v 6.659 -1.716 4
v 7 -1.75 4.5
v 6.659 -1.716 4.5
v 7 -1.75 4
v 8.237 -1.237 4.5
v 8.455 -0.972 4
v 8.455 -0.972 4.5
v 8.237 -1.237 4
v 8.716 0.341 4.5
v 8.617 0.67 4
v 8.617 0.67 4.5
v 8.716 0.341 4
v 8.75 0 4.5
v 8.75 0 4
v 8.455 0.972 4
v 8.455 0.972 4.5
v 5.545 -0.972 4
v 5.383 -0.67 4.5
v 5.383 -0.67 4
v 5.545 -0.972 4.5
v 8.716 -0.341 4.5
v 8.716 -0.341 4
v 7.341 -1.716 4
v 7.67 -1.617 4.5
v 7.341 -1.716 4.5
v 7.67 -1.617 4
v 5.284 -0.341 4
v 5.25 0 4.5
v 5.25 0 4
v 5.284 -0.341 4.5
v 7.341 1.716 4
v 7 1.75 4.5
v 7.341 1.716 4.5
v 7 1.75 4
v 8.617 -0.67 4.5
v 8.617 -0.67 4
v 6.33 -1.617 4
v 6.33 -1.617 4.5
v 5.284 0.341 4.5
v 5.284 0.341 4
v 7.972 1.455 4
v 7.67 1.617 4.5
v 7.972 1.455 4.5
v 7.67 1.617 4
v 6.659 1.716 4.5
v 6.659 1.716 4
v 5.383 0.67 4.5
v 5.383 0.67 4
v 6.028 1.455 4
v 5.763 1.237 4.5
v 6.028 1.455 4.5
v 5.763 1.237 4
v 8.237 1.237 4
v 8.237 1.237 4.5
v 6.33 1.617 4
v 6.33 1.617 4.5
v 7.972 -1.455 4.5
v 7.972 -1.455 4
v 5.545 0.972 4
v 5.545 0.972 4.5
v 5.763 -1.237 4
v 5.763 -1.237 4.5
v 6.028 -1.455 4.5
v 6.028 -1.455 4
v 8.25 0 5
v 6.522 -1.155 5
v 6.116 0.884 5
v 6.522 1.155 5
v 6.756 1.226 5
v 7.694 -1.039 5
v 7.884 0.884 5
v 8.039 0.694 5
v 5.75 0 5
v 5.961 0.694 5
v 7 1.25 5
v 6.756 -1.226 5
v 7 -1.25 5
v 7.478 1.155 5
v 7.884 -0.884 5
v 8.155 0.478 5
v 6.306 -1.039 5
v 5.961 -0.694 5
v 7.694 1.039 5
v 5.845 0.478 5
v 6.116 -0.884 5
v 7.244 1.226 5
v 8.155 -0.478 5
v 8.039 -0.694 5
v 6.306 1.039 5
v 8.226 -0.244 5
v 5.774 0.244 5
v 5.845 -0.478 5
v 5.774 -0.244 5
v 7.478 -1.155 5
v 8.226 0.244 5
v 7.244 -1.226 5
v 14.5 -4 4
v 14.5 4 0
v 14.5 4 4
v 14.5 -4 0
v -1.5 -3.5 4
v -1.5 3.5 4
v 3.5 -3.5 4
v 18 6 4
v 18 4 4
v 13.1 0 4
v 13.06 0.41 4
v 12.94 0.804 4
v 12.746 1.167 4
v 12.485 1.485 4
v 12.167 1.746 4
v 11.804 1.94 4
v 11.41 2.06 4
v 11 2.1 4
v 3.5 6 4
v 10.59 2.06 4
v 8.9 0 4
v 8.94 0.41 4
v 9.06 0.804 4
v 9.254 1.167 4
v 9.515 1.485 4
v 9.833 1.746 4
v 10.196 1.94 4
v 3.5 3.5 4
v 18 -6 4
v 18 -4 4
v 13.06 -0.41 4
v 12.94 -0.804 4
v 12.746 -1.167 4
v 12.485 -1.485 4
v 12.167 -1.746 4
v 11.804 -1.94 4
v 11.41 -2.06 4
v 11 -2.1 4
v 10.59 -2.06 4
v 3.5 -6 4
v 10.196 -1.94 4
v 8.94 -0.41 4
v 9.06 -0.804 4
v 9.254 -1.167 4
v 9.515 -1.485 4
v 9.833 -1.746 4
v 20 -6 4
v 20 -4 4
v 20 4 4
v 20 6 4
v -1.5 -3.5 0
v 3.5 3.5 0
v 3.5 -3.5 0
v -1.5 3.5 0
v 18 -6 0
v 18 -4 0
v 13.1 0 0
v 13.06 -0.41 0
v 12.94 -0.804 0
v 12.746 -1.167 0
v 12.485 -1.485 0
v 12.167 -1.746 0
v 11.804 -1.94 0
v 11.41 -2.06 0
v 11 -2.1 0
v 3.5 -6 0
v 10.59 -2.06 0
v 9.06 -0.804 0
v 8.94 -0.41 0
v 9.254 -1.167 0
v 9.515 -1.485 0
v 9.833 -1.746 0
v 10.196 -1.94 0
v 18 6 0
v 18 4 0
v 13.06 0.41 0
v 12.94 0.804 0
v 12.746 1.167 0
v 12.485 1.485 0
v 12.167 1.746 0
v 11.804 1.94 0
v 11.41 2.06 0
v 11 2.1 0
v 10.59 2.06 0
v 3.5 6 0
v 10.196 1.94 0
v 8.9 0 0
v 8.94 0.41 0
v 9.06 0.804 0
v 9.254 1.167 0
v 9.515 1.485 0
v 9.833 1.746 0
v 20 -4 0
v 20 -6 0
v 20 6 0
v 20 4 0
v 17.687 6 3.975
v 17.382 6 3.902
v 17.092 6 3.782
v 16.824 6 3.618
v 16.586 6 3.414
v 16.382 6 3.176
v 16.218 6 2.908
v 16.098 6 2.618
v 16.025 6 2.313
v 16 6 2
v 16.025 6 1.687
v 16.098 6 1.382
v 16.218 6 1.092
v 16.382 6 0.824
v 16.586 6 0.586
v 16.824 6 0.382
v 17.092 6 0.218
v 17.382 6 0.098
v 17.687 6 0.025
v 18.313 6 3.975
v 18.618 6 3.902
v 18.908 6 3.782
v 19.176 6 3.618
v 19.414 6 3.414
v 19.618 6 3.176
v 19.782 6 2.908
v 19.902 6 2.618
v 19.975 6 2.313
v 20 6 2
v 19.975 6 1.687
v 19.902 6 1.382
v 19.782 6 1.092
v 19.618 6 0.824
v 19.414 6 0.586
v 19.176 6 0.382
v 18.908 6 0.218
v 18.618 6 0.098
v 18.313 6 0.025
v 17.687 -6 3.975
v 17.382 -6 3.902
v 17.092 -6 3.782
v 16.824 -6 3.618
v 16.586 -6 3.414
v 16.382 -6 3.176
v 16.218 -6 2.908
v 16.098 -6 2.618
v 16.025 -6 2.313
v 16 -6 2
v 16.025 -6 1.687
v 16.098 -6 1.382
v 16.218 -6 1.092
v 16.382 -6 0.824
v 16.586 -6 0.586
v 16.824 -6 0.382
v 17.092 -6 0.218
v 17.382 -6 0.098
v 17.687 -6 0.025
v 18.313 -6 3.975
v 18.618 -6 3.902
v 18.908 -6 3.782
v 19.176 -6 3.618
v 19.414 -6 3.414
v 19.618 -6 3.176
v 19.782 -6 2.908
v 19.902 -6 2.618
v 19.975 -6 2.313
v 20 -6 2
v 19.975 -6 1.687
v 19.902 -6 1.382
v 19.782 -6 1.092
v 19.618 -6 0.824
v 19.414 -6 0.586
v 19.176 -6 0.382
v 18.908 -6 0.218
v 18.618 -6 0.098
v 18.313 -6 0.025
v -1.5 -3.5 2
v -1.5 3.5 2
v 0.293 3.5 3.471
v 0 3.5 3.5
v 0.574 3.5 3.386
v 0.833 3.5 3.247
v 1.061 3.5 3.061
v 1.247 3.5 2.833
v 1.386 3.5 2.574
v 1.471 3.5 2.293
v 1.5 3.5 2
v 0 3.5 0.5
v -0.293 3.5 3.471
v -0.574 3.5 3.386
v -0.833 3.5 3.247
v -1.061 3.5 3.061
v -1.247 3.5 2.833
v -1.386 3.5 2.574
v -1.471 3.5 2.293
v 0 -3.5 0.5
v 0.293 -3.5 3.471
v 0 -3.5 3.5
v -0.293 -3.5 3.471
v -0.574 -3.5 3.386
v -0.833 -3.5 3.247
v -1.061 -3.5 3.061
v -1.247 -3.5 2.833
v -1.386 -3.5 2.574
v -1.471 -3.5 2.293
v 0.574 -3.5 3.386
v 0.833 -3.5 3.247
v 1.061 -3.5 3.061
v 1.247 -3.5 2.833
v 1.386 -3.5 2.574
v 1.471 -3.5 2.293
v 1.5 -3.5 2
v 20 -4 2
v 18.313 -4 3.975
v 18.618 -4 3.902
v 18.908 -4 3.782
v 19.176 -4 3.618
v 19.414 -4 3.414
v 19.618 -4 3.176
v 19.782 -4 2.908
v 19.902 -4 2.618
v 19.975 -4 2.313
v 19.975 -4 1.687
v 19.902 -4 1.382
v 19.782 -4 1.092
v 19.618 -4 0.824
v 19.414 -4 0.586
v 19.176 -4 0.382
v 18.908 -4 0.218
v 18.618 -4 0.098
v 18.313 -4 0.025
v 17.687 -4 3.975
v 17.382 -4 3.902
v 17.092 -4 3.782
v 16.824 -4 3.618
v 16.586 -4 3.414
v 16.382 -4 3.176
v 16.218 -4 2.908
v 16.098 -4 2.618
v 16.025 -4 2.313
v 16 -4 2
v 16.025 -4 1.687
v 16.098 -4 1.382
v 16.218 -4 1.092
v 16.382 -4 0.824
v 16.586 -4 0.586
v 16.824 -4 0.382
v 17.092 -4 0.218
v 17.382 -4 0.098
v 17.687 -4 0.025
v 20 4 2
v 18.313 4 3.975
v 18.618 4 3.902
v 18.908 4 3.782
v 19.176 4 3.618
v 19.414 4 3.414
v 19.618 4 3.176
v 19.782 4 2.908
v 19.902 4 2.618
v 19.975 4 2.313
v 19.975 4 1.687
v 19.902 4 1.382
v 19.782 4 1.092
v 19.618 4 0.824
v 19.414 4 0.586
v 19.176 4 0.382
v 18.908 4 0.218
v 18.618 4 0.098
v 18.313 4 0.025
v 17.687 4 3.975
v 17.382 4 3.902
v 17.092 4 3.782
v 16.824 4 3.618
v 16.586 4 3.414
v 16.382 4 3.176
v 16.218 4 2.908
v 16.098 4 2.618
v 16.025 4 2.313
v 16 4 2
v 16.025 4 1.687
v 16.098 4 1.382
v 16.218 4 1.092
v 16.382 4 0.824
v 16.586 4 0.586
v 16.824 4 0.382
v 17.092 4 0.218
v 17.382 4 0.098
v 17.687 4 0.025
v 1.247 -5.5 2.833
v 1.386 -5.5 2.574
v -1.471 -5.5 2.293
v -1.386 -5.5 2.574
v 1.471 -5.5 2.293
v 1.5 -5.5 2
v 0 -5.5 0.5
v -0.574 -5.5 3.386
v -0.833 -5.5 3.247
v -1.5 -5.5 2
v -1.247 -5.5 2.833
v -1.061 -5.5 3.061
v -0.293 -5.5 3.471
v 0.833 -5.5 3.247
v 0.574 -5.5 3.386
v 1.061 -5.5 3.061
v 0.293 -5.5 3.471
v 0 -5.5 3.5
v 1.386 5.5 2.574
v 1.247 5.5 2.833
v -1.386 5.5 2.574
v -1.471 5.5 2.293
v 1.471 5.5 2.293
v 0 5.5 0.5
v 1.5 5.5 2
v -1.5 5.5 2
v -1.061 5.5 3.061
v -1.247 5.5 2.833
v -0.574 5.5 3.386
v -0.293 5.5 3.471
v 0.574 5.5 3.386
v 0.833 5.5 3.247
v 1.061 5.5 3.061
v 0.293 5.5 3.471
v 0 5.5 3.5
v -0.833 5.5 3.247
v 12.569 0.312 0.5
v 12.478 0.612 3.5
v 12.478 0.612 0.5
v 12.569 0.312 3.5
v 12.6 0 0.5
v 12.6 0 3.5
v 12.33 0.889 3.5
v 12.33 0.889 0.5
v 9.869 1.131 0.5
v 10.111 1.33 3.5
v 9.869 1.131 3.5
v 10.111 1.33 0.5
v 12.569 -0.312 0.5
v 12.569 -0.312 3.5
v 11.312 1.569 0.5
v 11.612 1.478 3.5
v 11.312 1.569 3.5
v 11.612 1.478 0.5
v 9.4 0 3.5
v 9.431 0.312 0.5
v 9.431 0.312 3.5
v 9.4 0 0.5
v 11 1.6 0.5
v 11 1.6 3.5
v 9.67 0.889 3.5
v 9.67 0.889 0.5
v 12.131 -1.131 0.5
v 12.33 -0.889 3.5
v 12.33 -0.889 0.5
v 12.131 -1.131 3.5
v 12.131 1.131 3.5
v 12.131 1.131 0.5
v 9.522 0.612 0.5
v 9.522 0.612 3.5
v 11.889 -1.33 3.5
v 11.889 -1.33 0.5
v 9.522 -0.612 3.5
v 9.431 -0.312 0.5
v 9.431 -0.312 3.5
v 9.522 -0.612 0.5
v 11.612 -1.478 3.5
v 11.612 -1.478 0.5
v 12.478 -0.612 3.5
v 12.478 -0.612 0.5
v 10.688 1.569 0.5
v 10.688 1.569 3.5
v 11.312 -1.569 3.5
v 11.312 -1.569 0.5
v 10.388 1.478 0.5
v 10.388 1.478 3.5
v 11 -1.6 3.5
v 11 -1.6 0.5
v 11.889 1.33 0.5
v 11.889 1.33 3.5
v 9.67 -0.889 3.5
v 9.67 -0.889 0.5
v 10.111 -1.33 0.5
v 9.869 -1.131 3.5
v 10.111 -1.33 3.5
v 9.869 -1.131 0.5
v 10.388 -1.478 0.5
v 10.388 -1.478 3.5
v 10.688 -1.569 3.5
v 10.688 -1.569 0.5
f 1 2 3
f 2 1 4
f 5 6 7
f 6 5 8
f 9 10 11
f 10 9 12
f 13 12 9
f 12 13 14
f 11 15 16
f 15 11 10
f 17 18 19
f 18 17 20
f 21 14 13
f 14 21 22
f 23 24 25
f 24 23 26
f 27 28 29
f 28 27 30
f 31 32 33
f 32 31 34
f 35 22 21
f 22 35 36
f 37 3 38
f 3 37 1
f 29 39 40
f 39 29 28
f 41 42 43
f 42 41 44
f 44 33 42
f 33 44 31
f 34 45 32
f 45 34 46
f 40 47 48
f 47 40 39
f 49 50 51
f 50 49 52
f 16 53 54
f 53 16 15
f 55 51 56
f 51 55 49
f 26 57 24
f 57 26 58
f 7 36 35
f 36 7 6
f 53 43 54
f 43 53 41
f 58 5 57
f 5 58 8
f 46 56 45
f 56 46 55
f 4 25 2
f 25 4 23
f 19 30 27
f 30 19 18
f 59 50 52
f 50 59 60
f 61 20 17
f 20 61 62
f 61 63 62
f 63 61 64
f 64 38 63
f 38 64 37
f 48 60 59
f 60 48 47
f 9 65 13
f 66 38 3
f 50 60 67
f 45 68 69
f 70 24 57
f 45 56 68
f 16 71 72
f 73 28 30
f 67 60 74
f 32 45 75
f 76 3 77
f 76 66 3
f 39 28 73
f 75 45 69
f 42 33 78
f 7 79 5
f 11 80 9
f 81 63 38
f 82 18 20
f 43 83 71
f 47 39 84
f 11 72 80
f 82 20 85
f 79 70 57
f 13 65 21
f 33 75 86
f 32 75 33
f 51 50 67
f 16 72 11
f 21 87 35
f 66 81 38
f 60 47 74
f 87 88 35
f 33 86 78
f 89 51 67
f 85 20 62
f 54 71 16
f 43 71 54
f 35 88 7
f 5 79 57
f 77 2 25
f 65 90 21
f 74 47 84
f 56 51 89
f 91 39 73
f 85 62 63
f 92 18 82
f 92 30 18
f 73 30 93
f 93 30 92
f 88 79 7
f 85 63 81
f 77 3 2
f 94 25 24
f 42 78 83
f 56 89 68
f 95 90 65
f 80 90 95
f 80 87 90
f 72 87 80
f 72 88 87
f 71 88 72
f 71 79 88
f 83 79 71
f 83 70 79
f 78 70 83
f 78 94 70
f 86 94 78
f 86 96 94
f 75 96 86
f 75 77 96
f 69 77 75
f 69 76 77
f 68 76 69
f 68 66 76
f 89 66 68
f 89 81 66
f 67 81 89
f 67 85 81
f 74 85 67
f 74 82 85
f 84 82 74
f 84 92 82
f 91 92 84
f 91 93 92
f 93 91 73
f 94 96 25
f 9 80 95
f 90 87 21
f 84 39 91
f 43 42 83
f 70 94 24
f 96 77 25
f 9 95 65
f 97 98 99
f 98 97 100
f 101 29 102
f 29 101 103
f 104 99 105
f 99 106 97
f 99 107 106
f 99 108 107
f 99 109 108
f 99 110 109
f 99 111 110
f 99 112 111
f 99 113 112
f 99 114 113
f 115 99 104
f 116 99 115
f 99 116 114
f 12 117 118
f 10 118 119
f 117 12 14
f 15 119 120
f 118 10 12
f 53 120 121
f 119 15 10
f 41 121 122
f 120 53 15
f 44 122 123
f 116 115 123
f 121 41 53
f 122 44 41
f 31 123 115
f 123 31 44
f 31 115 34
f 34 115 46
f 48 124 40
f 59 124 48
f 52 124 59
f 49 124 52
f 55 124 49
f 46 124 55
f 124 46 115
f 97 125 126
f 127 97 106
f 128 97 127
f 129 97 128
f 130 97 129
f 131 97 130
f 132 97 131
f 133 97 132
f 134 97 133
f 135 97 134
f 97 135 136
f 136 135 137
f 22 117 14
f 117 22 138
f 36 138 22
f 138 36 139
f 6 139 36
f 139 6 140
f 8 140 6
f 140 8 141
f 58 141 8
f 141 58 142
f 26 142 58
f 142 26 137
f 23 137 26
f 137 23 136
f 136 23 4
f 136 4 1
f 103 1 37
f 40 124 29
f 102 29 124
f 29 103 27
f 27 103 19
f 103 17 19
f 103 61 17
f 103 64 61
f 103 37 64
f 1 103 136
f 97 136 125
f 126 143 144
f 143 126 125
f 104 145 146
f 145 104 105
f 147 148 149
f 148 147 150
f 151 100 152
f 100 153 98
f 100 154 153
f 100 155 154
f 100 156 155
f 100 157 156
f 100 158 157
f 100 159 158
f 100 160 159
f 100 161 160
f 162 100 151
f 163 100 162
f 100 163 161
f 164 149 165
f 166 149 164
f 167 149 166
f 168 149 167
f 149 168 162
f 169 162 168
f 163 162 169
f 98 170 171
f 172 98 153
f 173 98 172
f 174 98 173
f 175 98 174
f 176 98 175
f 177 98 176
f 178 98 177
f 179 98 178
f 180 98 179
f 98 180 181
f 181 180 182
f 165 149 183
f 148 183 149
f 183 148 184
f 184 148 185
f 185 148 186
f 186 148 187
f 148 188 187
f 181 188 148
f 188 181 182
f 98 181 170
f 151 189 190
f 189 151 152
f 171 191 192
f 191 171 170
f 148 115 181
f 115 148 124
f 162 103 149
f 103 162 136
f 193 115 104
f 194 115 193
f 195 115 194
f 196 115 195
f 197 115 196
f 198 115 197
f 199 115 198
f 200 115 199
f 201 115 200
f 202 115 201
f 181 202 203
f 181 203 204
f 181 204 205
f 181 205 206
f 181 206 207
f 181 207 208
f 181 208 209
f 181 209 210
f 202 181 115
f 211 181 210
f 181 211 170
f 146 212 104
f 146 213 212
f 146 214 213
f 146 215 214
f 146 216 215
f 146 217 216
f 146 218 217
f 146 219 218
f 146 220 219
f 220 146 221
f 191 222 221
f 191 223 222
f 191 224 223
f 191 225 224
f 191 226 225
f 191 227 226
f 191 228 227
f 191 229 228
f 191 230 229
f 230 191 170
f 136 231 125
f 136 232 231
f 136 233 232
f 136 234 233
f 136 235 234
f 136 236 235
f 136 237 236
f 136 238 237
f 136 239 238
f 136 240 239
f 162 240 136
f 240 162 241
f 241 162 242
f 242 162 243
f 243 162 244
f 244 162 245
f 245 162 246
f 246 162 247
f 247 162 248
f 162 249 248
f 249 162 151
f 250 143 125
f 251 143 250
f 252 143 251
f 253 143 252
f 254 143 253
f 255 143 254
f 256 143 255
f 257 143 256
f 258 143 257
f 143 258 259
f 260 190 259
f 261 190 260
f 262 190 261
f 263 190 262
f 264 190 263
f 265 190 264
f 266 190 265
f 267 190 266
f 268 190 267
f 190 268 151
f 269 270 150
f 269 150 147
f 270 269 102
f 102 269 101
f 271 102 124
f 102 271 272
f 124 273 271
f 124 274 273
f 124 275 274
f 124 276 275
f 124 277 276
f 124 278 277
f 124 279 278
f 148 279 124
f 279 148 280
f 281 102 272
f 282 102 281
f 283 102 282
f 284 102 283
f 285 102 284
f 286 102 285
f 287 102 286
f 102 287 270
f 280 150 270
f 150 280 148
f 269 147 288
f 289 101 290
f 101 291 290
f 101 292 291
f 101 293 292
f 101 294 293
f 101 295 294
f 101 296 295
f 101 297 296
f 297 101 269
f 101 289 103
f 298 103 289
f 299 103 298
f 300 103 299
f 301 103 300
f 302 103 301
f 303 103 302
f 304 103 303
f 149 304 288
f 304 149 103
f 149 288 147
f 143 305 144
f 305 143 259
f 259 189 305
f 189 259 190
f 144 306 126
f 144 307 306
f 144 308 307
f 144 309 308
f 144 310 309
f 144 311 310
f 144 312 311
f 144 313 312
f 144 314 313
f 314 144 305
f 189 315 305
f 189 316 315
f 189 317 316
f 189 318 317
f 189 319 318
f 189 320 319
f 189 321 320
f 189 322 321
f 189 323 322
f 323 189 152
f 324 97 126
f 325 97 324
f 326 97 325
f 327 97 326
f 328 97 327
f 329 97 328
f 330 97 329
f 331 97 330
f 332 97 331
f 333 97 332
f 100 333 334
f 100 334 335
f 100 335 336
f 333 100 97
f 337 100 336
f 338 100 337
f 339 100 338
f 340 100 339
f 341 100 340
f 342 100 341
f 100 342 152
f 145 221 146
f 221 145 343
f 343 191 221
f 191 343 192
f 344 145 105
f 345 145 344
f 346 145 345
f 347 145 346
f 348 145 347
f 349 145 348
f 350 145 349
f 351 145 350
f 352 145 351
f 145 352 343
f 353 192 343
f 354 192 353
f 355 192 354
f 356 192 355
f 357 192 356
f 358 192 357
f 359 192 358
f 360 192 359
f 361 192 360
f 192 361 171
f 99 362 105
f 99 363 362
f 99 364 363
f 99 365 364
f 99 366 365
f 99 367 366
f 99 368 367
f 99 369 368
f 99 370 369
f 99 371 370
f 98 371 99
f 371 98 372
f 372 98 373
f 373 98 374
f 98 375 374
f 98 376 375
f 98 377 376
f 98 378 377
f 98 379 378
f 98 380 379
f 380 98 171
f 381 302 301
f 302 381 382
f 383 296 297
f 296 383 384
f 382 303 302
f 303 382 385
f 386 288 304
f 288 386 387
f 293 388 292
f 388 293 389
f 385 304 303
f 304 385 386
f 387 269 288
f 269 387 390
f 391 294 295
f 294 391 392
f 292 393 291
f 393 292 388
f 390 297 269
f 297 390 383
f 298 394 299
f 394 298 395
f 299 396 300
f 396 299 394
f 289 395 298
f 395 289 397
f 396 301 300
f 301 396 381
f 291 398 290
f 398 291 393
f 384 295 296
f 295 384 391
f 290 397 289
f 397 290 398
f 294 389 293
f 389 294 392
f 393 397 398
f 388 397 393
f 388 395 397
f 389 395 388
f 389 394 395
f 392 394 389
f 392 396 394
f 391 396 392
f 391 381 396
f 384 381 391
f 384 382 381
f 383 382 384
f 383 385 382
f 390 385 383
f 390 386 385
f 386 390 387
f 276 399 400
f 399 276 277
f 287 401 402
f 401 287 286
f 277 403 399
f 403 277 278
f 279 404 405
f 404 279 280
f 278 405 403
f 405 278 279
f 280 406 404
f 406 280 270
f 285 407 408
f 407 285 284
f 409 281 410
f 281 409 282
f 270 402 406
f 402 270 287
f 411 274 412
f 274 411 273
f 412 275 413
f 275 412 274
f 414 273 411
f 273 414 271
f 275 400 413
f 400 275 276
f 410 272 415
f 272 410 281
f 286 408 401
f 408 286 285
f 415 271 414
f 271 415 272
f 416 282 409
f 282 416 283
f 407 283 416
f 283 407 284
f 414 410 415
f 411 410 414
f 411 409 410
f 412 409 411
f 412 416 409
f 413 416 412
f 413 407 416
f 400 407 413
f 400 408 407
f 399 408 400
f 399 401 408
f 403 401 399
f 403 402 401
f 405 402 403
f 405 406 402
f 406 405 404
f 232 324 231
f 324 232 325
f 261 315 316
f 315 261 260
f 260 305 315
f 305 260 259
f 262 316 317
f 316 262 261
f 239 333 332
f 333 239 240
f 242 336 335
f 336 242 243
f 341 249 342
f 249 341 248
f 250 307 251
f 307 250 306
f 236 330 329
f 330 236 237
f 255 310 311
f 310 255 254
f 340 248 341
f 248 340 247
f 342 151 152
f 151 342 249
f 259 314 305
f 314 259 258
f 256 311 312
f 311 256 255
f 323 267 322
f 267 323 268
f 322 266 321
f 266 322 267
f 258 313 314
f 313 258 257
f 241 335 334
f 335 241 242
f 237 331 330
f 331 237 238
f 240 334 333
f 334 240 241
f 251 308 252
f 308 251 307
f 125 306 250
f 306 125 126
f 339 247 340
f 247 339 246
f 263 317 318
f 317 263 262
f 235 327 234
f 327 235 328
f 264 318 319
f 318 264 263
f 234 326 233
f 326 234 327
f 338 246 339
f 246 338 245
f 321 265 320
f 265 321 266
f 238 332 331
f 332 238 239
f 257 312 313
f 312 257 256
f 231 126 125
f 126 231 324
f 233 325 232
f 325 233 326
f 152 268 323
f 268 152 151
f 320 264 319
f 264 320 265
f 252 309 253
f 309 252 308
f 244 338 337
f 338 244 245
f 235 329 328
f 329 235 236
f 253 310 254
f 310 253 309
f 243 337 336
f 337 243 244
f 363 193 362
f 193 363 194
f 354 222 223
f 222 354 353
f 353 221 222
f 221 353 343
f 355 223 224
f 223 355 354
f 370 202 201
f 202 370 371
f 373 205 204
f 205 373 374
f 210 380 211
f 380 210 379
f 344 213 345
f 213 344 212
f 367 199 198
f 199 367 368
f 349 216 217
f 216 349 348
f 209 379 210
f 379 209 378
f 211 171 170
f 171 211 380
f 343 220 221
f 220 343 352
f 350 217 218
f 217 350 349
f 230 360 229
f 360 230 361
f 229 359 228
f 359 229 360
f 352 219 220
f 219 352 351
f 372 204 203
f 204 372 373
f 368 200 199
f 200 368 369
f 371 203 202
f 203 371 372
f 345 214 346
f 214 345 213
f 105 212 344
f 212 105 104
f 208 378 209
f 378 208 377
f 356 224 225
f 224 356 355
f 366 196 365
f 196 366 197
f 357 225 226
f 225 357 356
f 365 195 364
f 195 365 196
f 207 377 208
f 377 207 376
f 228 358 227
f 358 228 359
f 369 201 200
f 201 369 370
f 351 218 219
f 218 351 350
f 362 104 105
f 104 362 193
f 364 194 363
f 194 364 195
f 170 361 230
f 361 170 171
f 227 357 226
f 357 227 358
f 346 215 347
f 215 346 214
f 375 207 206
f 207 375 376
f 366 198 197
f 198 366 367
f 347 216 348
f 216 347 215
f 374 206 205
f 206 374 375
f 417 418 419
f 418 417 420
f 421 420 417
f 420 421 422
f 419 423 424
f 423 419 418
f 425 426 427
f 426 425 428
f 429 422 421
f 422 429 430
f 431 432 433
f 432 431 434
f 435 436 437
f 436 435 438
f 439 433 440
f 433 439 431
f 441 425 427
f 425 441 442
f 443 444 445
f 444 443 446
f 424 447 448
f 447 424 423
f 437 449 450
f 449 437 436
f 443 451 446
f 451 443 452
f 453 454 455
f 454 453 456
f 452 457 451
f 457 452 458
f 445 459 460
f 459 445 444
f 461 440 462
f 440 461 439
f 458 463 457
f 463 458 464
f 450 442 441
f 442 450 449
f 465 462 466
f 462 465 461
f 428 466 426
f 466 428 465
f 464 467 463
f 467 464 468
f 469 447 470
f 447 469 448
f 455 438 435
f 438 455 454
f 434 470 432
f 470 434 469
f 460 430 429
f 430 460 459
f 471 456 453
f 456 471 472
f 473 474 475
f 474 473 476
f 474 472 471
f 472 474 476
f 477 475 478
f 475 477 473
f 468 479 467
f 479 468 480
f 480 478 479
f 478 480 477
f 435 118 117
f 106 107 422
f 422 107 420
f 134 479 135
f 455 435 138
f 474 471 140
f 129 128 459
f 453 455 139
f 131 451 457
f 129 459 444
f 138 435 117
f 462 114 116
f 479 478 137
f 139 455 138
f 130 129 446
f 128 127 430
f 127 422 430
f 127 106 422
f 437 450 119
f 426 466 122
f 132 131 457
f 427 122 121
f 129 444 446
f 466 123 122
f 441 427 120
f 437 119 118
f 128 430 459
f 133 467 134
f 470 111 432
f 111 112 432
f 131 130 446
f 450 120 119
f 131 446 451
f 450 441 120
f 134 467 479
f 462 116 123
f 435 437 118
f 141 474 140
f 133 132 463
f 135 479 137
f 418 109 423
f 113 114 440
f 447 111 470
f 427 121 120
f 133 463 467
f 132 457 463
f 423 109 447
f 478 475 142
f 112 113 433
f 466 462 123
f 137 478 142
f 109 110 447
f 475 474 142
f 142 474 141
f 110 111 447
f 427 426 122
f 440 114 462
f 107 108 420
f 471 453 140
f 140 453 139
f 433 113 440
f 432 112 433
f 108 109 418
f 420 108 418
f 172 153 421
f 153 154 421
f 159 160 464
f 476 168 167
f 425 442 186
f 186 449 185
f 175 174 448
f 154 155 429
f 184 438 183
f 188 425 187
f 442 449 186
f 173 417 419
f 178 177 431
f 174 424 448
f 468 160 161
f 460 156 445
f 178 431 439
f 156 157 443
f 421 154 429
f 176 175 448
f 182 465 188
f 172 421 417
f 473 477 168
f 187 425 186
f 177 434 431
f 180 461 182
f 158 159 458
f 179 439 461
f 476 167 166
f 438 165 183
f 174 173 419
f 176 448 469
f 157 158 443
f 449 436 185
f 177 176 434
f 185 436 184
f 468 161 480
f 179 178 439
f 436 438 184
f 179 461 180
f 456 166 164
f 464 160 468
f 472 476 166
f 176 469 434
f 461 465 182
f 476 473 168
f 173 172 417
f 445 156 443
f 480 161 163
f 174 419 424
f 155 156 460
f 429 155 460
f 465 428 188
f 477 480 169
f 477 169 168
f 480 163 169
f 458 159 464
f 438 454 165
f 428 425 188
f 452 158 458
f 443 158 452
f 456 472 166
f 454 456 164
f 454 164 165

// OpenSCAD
// Bracelet of hinged links, printed in place
// Print orientation: flat on bed, +Z up, min z = 0
// Link: pitch 18 (X), width 12 (Y), thickness 5 (Z incl. snap stud)
// Hinge: horizontal pin along Y, teardrop pin in round hole, 0.5mm clearance

part = "link"; // [link, assembly]
cadverify_only = "";

module instance(name, part, unit = 1) {
    echo(cadverify_instance = [name, part, unit]);
    if (cadverify_only == "" || cadverify_only == name) children();
}

// ---- parameters ----
P = 18;            // pitch (hinge to hinge)
W = 12;            // width (Y)
Hb = 4;            // body thickness (Z 0-4)
Hs = 1;            // stud height (Z 4-5)
Zc = 2.0;          // hinge axis height
Rp = 1.5;          // pin radius (teardrop, tip dist 1.5)
Rh = 2.0;          // hole radius
Ytong = 3.5;       // tongue half width
Yin = 4.0;         // leaves inner face
Yout = 6.0;        // outer半 width
Xrear = -1.5;      // rear face (pin rear)
Xsr = 3.5;         // spine rear (overlap)
Xsf = 14.5;       // spine front (overlap)
Xlr = 13.5;        // leaves rear
Xfront = 20;       // front face
XpinR = 0;         // rear pin x
XpinF = 18;        // front hole x
studX = 7; studR = 1.75;
holeX = 11; holeR = 1.6;

module teardrop2D() {
    RpL = 1.5; ZcL = 2.0;
    pts = concat(
        [for (a=[0:180/16:180]) [RpL*cos(a), ZcL+RpL*sin(a)]],
        [[0, ZcL-RpL]]
    );
    polygon(pts);
}

module pin_stub(len) {
    linear_extrude(height=len)
        teardrop2D();
}

module stud_solid() {
    // base shaft r1.75, 3.9-4.5 + 45deg chamfer frustum to r1.25, 4.5-5.0
    translate([studX, 0, 3.9]) cylinder(r=studR, h=0.6, $fn=32);
    translate([studX, 0, 4.5]) cylinder(r1=studR, r2=1.25, h=0.5, $fn=32);
}

module link() {
    difference() {
        union() {
            // spine
            translate([Xsr, -6, 0]) cube([Xsf-Xsr, 12, 4]);
            // tongue (middle, thin in Y)
            translate([Xrear, -Ytong, 0]) cube([(4.5-Xrear), 7, 4]);
            // leaves (outer in Y)
            translate([Xlr, -6, 0]) cube([Xfront-Xlr, 2, 4]);
            translate([Xlr, 4, 0]) cube([Xfront-Xlr, 2, 4]);
            // pin stubs (teardrop, axis Y)
            translate([0, -3.0, 0]) rotate([90,0,0]) pin_stub(2.5);
            translate([0, 5.5, 0]) rotate([90,0,0]) pin_stub(2.5);
            // snap stud on top
            stud_solid();
        }
        // leaf holes (round, axis Y)
        translate([XpinF, -6.1, Zc]) rotate([-90,0,0]) cylinder(r=Rh, h=2.2, $fn=40);
        translate([XpinF, 3.9, Zc]) rotate([-90,0,0]) cylinder(r=Rh, h=2.2, $fn=40);
        // snap hole through (axis Z) + entry chamfers
        translate([holeX, 0, -0.1]) cylinder(r=holeR, h=4.2, $fn=32);
        translate([holeX, 0, 3.5]) cylinder(r1=holeR, r2=2.1, h=0.5, $fn=32);
        translate([holeX, 0, 0]) cylinder(r1=2.1, r2=holeR, h=0.5, $fn=32);
    }
}

if (part == "assembly") {
    echo(cadverify_spec = [
        ["bounds", [[-1.5, -6, 0], [56, 6, 5]]],
        ["support_faces", [["bed", "-z", 300]]],
        ["allowed_interferences", []],
        ["motions", [
            ["joint_bend", ["link3"], "rotate", [36, 0, 2], [0, 1, 0], [-30, 30]]
        ]],
        ["assembly_order", [
            [["link1"], [0, 0, 0]],
            [["link2"], [0, 0, -1]],
            [["link3"], [0, 0, -1]]
        ]],
        ["print_in_place", 0.5],
        ["overhangs_allowed", [
            ["hole top bridge span 2mm", [[16, 4, 3.4], [20, 6, 4]]],
            ["hole top bridge span 2mm", [[16, -6, 3.4], [20, -4, 4]]],
            ["hole top bridge span 2mm", [[34, 4, 3.4], [38, 6, 4]]],
            ["hole top bridge span 2mm", [[34, -6, 3.4], [38, -4, 4]]],
            ["hole top bridge span 2mm", [[52, 4, 3.4], [56, 6, 4]]],
            ["hole top bridge span 2mm", [[52, -6, 3.4], [56, -4, 4]]]
        ]]
    ]);
    instance("link1", "link", 1) translate([0, 0, 0]) link();
    instance("link2", "link", 1) translate([18, 0, 0]) link();
    instance("link3", "link", 1) translate([36, 0, 0]) link();
} else {
    echo(cadverify_spec = [
        ["bounds", [[-1.5, -6, 0], [20, 6, 5]]],
        ["bodies", 1],
        ["through_holes", 3],
        ["support_faces", [["bed", "-z", 100]]],
        ["overhangs_allowed", [
            ["hole top bridge span 2mm", [[16, 4, 3.4], [20, 6, 4]]],
            ["hole top bridge span 2mm", [[16, -6, 3.4], [20, -4, 4]]]
        ]],
        ["copies", 3],
        ["details", [
            ["spine", "material", [[5, -5, 0], [9, 5, 4]], 0.9],
            ["slot", "void", [[14.5, -4, 0], [20, 4, 4]], 0.9],
            ["pin_hole", "hole", [18, -8, 2], [0, 1, 0], [[0, 4], [2, 4]]],
            ["snap_hole", "hole", [11, 0, 6], [0, 0, -1], [[0, 4.2], [0.5, 3.2], [3.5, 3.2], [4, 4.2]]],
            ["floor", "thickness", [9, 3, -1], [0, 0, 1], 4],
            ["snap", "view", [[5, -2, 4], [9, 2, 5]]]
        ]]
    ]);
    link();
}
